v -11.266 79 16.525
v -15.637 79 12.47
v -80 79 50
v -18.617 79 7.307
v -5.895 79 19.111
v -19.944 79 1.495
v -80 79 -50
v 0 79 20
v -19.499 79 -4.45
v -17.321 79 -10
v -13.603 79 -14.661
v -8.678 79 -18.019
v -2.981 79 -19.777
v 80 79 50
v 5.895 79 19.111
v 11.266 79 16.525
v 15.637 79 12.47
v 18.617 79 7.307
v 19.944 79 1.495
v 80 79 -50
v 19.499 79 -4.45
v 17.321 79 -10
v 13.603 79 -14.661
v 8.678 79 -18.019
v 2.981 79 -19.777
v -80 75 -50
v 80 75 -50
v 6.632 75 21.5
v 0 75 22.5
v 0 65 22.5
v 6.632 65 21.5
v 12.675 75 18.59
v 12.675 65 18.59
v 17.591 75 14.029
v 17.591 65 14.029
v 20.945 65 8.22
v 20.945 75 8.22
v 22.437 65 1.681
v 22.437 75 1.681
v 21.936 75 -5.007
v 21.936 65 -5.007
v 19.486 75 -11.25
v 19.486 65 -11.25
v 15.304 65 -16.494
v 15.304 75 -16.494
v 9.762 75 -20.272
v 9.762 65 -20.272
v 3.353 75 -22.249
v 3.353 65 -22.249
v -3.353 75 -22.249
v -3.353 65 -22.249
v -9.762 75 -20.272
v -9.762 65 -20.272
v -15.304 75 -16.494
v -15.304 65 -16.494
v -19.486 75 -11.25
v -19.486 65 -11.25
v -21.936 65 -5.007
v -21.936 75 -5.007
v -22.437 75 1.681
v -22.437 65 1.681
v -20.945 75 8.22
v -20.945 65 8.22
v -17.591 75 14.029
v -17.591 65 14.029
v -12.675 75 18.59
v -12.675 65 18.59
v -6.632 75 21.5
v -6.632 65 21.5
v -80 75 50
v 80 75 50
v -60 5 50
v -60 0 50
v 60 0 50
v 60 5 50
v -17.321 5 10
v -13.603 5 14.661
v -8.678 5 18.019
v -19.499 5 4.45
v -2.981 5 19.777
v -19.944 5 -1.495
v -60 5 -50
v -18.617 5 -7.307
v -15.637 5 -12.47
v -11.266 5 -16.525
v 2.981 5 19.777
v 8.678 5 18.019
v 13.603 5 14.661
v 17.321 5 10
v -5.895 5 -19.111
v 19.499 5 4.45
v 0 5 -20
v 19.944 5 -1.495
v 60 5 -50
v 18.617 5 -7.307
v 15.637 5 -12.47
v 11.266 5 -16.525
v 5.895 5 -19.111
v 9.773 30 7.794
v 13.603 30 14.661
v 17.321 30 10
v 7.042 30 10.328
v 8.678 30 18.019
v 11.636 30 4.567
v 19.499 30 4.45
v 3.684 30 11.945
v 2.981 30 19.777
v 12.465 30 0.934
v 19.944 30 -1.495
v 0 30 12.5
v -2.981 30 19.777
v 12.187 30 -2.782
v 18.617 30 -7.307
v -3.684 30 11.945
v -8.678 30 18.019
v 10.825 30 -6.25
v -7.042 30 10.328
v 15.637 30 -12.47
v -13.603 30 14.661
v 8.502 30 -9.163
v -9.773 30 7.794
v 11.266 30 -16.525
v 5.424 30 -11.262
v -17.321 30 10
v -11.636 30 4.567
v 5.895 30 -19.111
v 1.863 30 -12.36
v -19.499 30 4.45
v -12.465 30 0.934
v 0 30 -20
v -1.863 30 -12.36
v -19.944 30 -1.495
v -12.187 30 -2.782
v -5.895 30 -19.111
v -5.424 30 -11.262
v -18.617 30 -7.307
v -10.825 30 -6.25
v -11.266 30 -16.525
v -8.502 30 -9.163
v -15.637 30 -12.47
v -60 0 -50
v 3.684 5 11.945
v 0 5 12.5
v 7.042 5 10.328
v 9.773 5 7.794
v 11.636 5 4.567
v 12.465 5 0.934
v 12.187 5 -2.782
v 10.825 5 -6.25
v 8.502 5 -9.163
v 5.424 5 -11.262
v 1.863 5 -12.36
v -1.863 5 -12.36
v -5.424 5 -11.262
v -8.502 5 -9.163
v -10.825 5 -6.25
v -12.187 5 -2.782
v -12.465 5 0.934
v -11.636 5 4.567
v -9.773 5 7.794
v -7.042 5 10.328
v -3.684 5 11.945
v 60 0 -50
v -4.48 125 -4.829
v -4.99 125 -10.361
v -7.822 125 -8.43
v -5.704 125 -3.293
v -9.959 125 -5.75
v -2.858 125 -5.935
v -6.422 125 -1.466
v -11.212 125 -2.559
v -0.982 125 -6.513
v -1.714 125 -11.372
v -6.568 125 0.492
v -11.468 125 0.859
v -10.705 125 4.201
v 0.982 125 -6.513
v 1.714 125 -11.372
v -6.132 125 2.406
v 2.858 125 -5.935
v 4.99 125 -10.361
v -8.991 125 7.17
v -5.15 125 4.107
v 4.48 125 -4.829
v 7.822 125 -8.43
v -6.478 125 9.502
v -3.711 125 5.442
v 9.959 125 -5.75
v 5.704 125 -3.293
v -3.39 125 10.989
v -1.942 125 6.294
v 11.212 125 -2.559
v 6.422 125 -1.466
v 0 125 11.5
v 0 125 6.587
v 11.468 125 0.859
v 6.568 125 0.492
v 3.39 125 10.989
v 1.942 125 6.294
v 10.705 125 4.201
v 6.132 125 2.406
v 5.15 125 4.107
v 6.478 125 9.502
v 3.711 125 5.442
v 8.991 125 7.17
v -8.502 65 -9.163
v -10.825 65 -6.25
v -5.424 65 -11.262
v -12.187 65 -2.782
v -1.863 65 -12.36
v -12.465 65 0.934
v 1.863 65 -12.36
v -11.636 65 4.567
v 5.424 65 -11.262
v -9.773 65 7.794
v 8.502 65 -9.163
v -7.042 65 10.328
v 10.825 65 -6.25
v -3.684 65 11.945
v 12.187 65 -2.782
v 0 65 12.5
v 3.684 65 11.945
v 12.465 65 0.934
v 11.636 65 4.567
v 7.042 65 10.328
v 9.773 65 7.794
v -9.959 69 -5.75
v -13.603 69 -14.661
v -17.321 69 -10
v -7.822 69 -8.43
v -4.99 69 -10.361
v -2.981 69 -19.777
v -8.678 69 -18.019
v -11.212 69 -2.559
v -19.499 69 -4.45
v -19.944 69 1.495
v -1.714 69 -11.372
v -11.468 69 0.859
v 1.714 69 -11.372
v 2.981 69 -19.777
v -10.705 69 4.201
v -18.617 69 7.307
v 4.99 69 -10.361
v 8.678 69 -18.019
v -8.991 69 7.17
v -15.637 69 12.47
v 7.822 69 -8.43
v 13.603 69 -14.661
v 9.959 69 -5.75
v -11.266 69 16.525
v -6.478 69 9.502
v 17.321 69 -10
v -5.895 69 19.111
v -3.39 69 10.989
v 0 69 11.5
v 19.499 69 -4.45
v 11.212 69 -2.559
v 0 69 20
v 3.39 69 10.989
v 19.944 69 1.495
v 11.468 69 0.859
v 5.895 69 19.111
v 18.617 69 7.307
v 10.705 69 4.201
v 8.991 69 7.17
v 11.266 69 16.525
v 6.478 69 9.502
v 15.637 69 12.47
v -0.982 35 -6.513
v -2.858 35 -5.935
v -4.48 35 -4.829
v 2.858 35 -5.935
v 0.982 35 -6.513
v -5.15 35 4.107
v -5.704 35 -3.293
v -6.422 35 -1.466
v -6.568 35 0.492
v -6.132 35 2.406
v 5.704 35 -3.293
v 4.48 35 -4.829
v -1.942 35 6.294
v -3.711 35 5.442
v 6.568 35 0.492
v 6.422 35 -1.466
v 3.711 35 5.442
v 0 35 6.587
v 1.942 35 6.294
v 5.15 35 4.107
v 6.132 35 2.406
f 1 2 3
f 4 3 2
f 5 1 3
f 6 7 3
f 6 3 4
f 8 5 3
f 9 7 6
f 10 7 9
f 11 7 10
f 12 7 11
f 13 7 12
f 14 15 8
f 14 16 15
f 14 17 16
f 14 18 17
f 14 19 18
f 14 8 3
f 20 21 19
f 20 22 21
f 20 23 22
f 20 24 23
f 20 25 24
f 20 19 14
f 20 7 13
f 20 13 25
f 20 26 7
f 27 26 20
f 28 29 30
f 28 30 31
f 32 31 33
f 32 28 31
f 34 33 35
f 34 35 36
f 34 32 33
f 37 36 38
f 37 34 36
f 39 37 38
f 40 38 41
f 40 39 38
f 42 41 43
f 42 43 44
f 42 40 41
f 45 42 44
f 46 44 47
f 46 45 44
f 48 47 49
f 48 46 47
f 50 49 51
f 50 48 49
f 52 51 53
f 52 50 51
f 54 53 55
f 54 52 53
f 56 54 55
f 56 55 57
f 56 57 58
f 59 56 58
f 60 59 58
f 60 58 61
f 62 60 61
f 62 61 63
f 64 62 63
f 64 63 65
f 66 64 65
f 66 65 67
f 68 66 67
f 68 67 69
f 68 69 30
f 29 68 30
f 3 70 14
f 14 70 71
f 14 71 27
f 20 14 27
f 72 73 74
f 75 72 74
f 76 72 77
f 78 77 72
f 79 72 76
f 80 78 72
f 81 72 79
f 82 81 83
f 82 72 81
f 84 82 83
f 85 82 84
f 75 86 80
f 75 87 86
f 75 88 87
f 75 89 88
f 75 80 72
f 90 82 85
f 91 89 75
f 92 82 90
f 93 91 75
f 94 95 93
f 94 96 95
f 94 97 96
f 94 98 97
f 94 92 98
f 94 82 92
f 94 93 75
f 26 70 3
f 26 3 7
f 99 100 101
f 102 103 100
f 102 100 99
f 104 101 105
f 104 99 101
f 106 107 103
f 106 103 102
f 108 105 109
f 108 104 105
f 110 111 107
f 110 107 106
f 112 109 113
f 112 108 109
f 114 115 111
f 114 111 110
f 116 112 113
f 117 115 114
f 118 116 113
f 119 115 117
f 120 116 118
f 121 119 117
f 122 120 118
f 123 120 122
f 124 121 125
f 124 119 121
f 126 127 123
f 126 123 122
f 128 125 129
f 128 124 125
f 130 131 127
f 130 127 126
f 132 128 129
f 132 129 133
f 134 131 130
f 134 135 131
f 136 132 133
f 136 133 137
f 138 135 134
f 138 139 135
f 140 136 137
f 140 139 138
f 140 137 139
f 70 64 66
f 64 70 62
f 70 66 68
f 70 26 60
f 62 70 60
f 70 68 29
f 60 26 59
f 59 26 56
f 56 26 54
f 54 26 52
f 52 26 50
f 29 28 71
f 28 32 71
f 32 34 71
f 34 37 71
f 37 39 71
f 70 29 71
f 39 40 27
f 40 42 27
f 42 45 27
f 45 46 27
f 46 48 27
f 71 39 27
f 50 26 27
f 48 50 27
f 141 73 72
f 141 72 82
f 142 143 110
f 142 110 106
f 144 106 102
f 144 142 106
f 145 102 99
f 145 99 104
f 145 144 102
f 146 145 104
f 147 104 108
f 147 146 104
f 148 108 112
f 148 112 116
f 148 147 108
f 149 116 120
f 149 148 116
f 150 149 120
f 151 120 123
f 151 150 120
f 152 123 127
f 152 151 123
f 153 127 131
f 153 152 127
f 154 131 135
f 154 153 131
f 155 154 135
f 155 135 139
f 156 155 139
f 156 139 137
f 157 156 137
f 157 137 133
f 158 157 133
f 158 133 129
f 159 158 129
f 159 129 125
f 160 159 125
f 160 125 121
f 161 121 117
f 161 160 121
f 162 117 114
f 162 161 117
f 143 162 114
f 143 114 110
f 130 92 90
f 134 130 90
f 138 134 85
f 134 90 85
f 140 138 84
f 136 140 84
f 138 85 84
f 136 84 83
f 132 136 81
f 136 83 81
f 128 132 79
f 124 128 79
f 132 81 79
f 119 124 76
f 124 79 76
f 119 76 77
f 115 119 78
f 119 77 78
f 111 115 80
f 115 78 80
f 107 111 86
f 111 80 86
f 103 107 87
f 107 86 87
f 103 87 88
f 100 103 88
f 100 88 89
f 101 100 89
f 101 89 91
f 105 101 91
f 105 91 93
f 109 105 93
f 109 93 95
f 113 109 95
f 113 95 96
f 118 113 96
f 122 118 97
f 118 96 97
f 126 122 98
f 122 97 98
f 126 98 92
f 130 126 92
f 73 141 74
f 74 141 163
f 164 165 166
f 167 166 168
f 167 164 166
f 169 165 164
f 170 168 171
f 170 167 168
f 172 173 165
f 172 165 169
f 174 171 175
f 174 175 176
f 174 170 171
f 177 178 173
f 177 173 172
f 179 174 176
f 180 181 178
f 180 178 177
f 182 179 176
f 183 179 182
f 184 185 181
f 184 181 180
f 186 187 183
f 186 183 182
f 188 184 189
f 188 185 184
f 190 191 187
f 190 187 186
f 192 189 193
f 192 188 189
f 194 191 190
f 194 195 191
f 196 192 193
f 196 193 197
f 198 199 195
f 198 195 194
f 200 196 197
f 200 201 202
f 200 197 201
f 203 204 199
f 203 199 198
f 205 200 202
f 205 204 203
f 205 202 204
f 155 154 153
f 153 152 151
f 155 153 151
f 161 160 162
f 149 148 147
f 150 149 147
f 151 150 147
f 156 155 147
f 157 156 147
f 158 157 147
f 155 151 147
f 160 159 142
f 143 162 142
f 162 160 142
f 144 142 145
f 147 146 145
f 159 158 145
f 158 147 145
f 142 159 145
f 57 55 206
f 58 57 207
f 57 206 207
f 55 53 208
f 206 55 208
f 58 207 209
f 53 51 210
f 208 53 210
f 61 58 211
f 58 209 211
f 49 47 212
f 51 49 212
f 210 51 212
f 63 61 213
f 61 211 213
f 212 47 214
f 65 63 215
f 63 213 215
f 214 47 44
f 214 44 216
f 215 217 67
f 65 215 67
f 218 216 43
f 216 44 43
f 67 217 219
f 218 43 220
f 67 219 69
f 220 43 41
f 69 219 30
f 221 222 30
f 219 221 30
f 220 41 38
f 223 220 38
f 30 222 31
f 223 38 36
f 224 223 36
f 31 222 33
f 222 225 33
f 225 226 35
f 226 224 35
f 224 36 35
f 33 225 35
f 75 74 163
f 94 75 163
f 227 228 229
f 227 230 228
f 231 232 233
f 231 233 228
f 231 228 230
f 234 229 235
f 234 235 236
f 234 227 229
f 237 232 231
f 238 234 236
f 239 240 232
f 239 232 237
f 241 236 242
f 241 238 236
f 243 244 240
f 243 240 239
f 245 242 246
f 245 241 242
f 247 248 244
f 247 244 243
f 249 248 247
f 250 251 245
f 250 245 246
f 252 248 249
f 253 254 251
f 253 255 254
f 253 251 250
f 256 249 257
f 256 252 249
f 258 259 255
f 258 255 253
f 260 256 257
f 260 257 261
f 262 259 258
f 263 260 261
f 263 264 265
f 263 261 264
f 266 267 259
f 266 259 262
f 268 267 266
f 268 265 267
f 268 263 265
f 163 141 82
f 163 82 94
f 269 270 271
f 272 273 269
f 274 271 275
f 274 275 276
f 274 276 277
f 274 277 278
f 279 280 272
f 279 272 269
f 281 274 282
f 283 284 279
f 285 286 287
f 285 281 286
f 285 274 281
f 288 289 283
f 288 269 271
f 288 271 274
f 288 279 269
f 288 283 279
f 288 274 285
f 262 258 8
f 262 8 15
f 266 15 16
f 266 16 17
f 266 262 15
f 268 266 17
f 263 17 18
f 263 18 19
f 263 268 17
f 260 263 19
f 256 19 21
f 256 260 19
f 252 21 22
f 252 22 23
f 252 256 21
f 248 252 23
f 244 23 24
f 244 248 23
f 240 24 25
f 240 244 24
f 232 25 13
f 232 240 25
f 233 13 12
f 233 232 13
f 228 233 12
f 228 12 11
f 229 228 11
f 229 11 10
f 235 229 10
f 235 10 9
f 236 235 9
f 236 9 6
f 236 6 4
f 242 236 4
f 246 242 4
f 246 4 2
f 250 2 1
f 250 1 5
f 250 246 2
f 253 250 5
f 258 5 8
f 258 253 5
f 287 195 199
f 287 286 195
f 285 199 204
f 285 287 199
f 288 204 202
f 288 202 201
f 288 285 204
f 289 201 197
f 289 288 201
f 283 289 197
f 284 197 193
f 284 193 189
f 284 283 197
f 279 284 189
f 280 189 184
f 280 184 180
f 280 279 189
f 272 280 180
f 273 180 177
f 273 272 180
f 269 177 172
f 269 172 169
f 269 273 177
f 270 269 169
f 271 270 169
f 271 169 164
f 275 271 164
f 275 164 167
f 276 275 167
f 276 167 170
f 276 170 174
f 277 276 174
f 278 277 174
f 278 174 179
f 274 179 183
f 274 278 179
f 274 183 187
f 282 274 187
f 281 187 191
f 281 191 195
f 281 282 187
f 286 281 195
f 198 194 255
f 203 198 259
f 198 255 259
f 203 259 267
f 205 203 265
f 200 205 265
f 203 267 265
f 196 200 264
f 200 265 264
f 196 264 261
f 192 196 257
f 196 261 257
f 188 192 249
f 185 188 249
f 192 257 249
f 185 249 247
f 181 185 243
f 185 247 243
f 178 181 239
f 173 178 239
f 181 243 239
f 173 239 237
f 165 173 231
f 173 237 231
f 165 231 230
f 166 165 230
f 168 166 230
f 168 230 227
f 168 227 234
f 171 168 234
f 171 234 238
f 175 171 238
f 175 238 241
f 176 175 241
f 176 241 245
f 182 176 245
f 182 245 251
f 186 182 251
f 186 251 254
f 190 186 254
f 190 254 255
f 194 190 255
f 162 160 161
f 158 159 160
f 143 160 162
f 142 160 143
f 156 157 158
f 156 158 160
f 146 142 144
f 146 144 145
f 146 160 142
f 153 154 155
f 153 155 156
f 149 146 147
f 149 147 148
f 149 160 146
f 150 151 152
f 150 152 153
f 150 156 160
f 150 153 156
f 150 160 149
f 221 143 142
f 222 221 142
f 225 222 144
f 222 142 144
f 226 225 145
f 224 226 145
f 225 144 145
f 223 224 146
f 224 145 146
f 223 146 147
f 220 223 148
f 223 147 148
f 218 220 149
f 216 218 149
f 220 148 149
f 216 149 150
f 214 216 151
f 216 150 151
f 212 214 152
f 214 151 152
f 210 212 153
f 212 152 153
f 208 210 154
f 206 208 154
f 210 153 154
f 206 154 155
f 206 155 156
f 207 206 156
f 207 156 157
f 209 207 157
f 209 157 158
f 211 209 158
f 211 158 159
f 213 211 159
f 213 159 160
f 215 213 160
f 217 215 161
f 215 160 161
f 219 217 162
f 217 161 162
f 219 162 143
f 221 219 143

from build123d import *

# Parameters (mm, degrees)
SKETCH1_W           = 120
SKETCH1_H           = 100
BOSS_EXTRUDE1_DEPTH = 5
SKETCH2_R           = 20
SKETCH2_R_2         = 12.5
BOSS_EXTRUDE2_DEPTH = 25
SKETCH4_R           = 12.5
BOSS_EXTRUDE3_DEPTH = 60
SKETCH5_R           = 6.586855475
CUT_EXTRUDE1_DEPTH  = 30
SKETCH9_R           = 11.5
SKETCH9_R_2         = 6.586855475
BOSS_EXTRUDE6_DEPTH = 60
BOSS_EXTRUDE4_START = 10
SKETCH6_W           = 160
SKETCH6_H           = 100
SKETCH6_R           = 12.5
BOSS_EXTRUDE4_DEPTH = 4
SKETCH10_R          = 22.5
SKETCH10_R_2        = 11.5
BOSS_EXTRUDE7_DEPTH = 14
CUT_EXTRUDE5_START  = -10
SKETCH8_R           = 20
SKETCH8_R_2         = 11.5
CUT_EXTRUDE5_DEPTH  = 10


with BuildPart() as part:
    # Sketch1 → Boss-Extrude1 (new body)
    with BuildSketch(Plane(origin=(0, 0, 0), x_dir=(1, 0, 0), z_dir=(0, 1, 0))):
        Rectangle(SKETCH1_W, SKETCH1_H)
    extrude(amount=BOSS_EXTRUDE1_DEPTH)

    # Sketch2 → Boss-Extrude2 (add)
    with BuildSketch(Plane(origin=(0, 5, 0), x_dir=(1, 0, 0), z_dir=(0, 1, 0))):
        with Locations(Location((0, 0, 0), (0, 0, 90))):
            Circle(SKETCH2_R)
        with Locations(Location((0, 0, 0), (0, 0, 270))):
            Circle(SKETCH2_R_2, mode=Mode.SUBTRACT)
    extrude(amount=BOSS_EXTRUDE2_DEPTH)


with BuildPart() as body_2:
    # Sketch4 → Boss-Extrude3 (new body)
    with BuildSketch(Plane(origin=(0, 5, 0), x_dir=(1, 0, 0), z_dir=(0, 1, 0))):
        with Locations(Location((0, 0, 0), (0, 0, 270))):
            Circle(SKETCH4_R)
    extrude(amount=BOSS_EXTRUDE3_DEPTH)

    # Sketch5 → Cut-Extrude1 (cut)
    with BuildSketch(Plane(origin=(0, 65, 0), x_dir=(1, 0, 0), z_dir=(0, 1, 0))):
        with Locations(Location((0, 0, 0), (0, 0, 270))):
            Circle(SKETCH5_R)
    extrude(amount=-CUT_EXTRUDE1_DEPTH, mode=Mode.SUBTRACT)

    # Sketch9 → Boss-Extrude6 (add)
    with BuildSketch(Plane(origin=(0, 65, 0), x_dir=(1, 0, 0), z_dir=(0, 1, 0))):
        with Locations(Location((0, 0, 0), (0, 0, 270))):
            Circle(SKETCH9_R)
        with Locations(Location((0, 0, 0), (0, 0, 270))):
            Circle(SKETCH9_R_2, mode=Mode.SUBTRACT)
    extrude(amount=BOSS_EXTRUDE6_DEPTH)



with BuildPart() as body_3:
    # Sketch6 → Boss-Extrude4 (new body)
    with BuildSketch(Plane(origin=(0, 65, 0), x_dir=(1, 0, 0), z_dir=(0, 1, 0)).offset(BOSS_EXTRUDE4_START)):
        Rectangle(SKETCH6_W, SKETCH6_H)
        with Locations(Location((0, 0, 0), (0, 0, 270))):
            Circle(SKETCH6_R, mode=Mode.SUBTRACT)
    extrude(amount=BOSS_EXTRUDE4_DEPTH)


with BuildPart() as body_2_1:
    add(body_2.part)

    add(body_3.part)  # Boss-Extrude7 merges body 3
    # Sketch10 → Boss-Extrude7 (add)
    with BuildSketch(Plane(origin=(0, 79, 0), x_dir=(1, 0, 0), z_dir=(0, 1, 0))):
        with Locations(Location((0, 0, 0), (0, 0, 270))):
            Circle(SKETCH10_R)
        with Locations(Location((0, 0, 0), (0, 0, 270))):
            Circle(SKETCH10_R_2, mode=Mode.SUBTRACT)
    extrude(amount=-BOSS_EXTRUDE7_DEPTH)

    # Sketch8 → Cut-Extrude5 (cut)
    with BuildSketch(Plane(origin=(0, 79, 0), x_dir=(1, 0, 0), z_dir=(0, 1, 0)).offset(CUT_EXTRUDE5_START)):
        with Locations(Location((0, 0, 0), (0, 0, 270))):
            Circle(SKETCH8_R)
        with Locations(Location((0, 0, 0), (0, 0, 270))):
            Circle(SKETCH8_R_2, mode=Mode.SUBTRACT)
    extrude(amount=CUT_EXTRUDE5_DEPTH, mode=Mode.SUBTRACT)


solid = Compound([part.part, body_2_1.part])
